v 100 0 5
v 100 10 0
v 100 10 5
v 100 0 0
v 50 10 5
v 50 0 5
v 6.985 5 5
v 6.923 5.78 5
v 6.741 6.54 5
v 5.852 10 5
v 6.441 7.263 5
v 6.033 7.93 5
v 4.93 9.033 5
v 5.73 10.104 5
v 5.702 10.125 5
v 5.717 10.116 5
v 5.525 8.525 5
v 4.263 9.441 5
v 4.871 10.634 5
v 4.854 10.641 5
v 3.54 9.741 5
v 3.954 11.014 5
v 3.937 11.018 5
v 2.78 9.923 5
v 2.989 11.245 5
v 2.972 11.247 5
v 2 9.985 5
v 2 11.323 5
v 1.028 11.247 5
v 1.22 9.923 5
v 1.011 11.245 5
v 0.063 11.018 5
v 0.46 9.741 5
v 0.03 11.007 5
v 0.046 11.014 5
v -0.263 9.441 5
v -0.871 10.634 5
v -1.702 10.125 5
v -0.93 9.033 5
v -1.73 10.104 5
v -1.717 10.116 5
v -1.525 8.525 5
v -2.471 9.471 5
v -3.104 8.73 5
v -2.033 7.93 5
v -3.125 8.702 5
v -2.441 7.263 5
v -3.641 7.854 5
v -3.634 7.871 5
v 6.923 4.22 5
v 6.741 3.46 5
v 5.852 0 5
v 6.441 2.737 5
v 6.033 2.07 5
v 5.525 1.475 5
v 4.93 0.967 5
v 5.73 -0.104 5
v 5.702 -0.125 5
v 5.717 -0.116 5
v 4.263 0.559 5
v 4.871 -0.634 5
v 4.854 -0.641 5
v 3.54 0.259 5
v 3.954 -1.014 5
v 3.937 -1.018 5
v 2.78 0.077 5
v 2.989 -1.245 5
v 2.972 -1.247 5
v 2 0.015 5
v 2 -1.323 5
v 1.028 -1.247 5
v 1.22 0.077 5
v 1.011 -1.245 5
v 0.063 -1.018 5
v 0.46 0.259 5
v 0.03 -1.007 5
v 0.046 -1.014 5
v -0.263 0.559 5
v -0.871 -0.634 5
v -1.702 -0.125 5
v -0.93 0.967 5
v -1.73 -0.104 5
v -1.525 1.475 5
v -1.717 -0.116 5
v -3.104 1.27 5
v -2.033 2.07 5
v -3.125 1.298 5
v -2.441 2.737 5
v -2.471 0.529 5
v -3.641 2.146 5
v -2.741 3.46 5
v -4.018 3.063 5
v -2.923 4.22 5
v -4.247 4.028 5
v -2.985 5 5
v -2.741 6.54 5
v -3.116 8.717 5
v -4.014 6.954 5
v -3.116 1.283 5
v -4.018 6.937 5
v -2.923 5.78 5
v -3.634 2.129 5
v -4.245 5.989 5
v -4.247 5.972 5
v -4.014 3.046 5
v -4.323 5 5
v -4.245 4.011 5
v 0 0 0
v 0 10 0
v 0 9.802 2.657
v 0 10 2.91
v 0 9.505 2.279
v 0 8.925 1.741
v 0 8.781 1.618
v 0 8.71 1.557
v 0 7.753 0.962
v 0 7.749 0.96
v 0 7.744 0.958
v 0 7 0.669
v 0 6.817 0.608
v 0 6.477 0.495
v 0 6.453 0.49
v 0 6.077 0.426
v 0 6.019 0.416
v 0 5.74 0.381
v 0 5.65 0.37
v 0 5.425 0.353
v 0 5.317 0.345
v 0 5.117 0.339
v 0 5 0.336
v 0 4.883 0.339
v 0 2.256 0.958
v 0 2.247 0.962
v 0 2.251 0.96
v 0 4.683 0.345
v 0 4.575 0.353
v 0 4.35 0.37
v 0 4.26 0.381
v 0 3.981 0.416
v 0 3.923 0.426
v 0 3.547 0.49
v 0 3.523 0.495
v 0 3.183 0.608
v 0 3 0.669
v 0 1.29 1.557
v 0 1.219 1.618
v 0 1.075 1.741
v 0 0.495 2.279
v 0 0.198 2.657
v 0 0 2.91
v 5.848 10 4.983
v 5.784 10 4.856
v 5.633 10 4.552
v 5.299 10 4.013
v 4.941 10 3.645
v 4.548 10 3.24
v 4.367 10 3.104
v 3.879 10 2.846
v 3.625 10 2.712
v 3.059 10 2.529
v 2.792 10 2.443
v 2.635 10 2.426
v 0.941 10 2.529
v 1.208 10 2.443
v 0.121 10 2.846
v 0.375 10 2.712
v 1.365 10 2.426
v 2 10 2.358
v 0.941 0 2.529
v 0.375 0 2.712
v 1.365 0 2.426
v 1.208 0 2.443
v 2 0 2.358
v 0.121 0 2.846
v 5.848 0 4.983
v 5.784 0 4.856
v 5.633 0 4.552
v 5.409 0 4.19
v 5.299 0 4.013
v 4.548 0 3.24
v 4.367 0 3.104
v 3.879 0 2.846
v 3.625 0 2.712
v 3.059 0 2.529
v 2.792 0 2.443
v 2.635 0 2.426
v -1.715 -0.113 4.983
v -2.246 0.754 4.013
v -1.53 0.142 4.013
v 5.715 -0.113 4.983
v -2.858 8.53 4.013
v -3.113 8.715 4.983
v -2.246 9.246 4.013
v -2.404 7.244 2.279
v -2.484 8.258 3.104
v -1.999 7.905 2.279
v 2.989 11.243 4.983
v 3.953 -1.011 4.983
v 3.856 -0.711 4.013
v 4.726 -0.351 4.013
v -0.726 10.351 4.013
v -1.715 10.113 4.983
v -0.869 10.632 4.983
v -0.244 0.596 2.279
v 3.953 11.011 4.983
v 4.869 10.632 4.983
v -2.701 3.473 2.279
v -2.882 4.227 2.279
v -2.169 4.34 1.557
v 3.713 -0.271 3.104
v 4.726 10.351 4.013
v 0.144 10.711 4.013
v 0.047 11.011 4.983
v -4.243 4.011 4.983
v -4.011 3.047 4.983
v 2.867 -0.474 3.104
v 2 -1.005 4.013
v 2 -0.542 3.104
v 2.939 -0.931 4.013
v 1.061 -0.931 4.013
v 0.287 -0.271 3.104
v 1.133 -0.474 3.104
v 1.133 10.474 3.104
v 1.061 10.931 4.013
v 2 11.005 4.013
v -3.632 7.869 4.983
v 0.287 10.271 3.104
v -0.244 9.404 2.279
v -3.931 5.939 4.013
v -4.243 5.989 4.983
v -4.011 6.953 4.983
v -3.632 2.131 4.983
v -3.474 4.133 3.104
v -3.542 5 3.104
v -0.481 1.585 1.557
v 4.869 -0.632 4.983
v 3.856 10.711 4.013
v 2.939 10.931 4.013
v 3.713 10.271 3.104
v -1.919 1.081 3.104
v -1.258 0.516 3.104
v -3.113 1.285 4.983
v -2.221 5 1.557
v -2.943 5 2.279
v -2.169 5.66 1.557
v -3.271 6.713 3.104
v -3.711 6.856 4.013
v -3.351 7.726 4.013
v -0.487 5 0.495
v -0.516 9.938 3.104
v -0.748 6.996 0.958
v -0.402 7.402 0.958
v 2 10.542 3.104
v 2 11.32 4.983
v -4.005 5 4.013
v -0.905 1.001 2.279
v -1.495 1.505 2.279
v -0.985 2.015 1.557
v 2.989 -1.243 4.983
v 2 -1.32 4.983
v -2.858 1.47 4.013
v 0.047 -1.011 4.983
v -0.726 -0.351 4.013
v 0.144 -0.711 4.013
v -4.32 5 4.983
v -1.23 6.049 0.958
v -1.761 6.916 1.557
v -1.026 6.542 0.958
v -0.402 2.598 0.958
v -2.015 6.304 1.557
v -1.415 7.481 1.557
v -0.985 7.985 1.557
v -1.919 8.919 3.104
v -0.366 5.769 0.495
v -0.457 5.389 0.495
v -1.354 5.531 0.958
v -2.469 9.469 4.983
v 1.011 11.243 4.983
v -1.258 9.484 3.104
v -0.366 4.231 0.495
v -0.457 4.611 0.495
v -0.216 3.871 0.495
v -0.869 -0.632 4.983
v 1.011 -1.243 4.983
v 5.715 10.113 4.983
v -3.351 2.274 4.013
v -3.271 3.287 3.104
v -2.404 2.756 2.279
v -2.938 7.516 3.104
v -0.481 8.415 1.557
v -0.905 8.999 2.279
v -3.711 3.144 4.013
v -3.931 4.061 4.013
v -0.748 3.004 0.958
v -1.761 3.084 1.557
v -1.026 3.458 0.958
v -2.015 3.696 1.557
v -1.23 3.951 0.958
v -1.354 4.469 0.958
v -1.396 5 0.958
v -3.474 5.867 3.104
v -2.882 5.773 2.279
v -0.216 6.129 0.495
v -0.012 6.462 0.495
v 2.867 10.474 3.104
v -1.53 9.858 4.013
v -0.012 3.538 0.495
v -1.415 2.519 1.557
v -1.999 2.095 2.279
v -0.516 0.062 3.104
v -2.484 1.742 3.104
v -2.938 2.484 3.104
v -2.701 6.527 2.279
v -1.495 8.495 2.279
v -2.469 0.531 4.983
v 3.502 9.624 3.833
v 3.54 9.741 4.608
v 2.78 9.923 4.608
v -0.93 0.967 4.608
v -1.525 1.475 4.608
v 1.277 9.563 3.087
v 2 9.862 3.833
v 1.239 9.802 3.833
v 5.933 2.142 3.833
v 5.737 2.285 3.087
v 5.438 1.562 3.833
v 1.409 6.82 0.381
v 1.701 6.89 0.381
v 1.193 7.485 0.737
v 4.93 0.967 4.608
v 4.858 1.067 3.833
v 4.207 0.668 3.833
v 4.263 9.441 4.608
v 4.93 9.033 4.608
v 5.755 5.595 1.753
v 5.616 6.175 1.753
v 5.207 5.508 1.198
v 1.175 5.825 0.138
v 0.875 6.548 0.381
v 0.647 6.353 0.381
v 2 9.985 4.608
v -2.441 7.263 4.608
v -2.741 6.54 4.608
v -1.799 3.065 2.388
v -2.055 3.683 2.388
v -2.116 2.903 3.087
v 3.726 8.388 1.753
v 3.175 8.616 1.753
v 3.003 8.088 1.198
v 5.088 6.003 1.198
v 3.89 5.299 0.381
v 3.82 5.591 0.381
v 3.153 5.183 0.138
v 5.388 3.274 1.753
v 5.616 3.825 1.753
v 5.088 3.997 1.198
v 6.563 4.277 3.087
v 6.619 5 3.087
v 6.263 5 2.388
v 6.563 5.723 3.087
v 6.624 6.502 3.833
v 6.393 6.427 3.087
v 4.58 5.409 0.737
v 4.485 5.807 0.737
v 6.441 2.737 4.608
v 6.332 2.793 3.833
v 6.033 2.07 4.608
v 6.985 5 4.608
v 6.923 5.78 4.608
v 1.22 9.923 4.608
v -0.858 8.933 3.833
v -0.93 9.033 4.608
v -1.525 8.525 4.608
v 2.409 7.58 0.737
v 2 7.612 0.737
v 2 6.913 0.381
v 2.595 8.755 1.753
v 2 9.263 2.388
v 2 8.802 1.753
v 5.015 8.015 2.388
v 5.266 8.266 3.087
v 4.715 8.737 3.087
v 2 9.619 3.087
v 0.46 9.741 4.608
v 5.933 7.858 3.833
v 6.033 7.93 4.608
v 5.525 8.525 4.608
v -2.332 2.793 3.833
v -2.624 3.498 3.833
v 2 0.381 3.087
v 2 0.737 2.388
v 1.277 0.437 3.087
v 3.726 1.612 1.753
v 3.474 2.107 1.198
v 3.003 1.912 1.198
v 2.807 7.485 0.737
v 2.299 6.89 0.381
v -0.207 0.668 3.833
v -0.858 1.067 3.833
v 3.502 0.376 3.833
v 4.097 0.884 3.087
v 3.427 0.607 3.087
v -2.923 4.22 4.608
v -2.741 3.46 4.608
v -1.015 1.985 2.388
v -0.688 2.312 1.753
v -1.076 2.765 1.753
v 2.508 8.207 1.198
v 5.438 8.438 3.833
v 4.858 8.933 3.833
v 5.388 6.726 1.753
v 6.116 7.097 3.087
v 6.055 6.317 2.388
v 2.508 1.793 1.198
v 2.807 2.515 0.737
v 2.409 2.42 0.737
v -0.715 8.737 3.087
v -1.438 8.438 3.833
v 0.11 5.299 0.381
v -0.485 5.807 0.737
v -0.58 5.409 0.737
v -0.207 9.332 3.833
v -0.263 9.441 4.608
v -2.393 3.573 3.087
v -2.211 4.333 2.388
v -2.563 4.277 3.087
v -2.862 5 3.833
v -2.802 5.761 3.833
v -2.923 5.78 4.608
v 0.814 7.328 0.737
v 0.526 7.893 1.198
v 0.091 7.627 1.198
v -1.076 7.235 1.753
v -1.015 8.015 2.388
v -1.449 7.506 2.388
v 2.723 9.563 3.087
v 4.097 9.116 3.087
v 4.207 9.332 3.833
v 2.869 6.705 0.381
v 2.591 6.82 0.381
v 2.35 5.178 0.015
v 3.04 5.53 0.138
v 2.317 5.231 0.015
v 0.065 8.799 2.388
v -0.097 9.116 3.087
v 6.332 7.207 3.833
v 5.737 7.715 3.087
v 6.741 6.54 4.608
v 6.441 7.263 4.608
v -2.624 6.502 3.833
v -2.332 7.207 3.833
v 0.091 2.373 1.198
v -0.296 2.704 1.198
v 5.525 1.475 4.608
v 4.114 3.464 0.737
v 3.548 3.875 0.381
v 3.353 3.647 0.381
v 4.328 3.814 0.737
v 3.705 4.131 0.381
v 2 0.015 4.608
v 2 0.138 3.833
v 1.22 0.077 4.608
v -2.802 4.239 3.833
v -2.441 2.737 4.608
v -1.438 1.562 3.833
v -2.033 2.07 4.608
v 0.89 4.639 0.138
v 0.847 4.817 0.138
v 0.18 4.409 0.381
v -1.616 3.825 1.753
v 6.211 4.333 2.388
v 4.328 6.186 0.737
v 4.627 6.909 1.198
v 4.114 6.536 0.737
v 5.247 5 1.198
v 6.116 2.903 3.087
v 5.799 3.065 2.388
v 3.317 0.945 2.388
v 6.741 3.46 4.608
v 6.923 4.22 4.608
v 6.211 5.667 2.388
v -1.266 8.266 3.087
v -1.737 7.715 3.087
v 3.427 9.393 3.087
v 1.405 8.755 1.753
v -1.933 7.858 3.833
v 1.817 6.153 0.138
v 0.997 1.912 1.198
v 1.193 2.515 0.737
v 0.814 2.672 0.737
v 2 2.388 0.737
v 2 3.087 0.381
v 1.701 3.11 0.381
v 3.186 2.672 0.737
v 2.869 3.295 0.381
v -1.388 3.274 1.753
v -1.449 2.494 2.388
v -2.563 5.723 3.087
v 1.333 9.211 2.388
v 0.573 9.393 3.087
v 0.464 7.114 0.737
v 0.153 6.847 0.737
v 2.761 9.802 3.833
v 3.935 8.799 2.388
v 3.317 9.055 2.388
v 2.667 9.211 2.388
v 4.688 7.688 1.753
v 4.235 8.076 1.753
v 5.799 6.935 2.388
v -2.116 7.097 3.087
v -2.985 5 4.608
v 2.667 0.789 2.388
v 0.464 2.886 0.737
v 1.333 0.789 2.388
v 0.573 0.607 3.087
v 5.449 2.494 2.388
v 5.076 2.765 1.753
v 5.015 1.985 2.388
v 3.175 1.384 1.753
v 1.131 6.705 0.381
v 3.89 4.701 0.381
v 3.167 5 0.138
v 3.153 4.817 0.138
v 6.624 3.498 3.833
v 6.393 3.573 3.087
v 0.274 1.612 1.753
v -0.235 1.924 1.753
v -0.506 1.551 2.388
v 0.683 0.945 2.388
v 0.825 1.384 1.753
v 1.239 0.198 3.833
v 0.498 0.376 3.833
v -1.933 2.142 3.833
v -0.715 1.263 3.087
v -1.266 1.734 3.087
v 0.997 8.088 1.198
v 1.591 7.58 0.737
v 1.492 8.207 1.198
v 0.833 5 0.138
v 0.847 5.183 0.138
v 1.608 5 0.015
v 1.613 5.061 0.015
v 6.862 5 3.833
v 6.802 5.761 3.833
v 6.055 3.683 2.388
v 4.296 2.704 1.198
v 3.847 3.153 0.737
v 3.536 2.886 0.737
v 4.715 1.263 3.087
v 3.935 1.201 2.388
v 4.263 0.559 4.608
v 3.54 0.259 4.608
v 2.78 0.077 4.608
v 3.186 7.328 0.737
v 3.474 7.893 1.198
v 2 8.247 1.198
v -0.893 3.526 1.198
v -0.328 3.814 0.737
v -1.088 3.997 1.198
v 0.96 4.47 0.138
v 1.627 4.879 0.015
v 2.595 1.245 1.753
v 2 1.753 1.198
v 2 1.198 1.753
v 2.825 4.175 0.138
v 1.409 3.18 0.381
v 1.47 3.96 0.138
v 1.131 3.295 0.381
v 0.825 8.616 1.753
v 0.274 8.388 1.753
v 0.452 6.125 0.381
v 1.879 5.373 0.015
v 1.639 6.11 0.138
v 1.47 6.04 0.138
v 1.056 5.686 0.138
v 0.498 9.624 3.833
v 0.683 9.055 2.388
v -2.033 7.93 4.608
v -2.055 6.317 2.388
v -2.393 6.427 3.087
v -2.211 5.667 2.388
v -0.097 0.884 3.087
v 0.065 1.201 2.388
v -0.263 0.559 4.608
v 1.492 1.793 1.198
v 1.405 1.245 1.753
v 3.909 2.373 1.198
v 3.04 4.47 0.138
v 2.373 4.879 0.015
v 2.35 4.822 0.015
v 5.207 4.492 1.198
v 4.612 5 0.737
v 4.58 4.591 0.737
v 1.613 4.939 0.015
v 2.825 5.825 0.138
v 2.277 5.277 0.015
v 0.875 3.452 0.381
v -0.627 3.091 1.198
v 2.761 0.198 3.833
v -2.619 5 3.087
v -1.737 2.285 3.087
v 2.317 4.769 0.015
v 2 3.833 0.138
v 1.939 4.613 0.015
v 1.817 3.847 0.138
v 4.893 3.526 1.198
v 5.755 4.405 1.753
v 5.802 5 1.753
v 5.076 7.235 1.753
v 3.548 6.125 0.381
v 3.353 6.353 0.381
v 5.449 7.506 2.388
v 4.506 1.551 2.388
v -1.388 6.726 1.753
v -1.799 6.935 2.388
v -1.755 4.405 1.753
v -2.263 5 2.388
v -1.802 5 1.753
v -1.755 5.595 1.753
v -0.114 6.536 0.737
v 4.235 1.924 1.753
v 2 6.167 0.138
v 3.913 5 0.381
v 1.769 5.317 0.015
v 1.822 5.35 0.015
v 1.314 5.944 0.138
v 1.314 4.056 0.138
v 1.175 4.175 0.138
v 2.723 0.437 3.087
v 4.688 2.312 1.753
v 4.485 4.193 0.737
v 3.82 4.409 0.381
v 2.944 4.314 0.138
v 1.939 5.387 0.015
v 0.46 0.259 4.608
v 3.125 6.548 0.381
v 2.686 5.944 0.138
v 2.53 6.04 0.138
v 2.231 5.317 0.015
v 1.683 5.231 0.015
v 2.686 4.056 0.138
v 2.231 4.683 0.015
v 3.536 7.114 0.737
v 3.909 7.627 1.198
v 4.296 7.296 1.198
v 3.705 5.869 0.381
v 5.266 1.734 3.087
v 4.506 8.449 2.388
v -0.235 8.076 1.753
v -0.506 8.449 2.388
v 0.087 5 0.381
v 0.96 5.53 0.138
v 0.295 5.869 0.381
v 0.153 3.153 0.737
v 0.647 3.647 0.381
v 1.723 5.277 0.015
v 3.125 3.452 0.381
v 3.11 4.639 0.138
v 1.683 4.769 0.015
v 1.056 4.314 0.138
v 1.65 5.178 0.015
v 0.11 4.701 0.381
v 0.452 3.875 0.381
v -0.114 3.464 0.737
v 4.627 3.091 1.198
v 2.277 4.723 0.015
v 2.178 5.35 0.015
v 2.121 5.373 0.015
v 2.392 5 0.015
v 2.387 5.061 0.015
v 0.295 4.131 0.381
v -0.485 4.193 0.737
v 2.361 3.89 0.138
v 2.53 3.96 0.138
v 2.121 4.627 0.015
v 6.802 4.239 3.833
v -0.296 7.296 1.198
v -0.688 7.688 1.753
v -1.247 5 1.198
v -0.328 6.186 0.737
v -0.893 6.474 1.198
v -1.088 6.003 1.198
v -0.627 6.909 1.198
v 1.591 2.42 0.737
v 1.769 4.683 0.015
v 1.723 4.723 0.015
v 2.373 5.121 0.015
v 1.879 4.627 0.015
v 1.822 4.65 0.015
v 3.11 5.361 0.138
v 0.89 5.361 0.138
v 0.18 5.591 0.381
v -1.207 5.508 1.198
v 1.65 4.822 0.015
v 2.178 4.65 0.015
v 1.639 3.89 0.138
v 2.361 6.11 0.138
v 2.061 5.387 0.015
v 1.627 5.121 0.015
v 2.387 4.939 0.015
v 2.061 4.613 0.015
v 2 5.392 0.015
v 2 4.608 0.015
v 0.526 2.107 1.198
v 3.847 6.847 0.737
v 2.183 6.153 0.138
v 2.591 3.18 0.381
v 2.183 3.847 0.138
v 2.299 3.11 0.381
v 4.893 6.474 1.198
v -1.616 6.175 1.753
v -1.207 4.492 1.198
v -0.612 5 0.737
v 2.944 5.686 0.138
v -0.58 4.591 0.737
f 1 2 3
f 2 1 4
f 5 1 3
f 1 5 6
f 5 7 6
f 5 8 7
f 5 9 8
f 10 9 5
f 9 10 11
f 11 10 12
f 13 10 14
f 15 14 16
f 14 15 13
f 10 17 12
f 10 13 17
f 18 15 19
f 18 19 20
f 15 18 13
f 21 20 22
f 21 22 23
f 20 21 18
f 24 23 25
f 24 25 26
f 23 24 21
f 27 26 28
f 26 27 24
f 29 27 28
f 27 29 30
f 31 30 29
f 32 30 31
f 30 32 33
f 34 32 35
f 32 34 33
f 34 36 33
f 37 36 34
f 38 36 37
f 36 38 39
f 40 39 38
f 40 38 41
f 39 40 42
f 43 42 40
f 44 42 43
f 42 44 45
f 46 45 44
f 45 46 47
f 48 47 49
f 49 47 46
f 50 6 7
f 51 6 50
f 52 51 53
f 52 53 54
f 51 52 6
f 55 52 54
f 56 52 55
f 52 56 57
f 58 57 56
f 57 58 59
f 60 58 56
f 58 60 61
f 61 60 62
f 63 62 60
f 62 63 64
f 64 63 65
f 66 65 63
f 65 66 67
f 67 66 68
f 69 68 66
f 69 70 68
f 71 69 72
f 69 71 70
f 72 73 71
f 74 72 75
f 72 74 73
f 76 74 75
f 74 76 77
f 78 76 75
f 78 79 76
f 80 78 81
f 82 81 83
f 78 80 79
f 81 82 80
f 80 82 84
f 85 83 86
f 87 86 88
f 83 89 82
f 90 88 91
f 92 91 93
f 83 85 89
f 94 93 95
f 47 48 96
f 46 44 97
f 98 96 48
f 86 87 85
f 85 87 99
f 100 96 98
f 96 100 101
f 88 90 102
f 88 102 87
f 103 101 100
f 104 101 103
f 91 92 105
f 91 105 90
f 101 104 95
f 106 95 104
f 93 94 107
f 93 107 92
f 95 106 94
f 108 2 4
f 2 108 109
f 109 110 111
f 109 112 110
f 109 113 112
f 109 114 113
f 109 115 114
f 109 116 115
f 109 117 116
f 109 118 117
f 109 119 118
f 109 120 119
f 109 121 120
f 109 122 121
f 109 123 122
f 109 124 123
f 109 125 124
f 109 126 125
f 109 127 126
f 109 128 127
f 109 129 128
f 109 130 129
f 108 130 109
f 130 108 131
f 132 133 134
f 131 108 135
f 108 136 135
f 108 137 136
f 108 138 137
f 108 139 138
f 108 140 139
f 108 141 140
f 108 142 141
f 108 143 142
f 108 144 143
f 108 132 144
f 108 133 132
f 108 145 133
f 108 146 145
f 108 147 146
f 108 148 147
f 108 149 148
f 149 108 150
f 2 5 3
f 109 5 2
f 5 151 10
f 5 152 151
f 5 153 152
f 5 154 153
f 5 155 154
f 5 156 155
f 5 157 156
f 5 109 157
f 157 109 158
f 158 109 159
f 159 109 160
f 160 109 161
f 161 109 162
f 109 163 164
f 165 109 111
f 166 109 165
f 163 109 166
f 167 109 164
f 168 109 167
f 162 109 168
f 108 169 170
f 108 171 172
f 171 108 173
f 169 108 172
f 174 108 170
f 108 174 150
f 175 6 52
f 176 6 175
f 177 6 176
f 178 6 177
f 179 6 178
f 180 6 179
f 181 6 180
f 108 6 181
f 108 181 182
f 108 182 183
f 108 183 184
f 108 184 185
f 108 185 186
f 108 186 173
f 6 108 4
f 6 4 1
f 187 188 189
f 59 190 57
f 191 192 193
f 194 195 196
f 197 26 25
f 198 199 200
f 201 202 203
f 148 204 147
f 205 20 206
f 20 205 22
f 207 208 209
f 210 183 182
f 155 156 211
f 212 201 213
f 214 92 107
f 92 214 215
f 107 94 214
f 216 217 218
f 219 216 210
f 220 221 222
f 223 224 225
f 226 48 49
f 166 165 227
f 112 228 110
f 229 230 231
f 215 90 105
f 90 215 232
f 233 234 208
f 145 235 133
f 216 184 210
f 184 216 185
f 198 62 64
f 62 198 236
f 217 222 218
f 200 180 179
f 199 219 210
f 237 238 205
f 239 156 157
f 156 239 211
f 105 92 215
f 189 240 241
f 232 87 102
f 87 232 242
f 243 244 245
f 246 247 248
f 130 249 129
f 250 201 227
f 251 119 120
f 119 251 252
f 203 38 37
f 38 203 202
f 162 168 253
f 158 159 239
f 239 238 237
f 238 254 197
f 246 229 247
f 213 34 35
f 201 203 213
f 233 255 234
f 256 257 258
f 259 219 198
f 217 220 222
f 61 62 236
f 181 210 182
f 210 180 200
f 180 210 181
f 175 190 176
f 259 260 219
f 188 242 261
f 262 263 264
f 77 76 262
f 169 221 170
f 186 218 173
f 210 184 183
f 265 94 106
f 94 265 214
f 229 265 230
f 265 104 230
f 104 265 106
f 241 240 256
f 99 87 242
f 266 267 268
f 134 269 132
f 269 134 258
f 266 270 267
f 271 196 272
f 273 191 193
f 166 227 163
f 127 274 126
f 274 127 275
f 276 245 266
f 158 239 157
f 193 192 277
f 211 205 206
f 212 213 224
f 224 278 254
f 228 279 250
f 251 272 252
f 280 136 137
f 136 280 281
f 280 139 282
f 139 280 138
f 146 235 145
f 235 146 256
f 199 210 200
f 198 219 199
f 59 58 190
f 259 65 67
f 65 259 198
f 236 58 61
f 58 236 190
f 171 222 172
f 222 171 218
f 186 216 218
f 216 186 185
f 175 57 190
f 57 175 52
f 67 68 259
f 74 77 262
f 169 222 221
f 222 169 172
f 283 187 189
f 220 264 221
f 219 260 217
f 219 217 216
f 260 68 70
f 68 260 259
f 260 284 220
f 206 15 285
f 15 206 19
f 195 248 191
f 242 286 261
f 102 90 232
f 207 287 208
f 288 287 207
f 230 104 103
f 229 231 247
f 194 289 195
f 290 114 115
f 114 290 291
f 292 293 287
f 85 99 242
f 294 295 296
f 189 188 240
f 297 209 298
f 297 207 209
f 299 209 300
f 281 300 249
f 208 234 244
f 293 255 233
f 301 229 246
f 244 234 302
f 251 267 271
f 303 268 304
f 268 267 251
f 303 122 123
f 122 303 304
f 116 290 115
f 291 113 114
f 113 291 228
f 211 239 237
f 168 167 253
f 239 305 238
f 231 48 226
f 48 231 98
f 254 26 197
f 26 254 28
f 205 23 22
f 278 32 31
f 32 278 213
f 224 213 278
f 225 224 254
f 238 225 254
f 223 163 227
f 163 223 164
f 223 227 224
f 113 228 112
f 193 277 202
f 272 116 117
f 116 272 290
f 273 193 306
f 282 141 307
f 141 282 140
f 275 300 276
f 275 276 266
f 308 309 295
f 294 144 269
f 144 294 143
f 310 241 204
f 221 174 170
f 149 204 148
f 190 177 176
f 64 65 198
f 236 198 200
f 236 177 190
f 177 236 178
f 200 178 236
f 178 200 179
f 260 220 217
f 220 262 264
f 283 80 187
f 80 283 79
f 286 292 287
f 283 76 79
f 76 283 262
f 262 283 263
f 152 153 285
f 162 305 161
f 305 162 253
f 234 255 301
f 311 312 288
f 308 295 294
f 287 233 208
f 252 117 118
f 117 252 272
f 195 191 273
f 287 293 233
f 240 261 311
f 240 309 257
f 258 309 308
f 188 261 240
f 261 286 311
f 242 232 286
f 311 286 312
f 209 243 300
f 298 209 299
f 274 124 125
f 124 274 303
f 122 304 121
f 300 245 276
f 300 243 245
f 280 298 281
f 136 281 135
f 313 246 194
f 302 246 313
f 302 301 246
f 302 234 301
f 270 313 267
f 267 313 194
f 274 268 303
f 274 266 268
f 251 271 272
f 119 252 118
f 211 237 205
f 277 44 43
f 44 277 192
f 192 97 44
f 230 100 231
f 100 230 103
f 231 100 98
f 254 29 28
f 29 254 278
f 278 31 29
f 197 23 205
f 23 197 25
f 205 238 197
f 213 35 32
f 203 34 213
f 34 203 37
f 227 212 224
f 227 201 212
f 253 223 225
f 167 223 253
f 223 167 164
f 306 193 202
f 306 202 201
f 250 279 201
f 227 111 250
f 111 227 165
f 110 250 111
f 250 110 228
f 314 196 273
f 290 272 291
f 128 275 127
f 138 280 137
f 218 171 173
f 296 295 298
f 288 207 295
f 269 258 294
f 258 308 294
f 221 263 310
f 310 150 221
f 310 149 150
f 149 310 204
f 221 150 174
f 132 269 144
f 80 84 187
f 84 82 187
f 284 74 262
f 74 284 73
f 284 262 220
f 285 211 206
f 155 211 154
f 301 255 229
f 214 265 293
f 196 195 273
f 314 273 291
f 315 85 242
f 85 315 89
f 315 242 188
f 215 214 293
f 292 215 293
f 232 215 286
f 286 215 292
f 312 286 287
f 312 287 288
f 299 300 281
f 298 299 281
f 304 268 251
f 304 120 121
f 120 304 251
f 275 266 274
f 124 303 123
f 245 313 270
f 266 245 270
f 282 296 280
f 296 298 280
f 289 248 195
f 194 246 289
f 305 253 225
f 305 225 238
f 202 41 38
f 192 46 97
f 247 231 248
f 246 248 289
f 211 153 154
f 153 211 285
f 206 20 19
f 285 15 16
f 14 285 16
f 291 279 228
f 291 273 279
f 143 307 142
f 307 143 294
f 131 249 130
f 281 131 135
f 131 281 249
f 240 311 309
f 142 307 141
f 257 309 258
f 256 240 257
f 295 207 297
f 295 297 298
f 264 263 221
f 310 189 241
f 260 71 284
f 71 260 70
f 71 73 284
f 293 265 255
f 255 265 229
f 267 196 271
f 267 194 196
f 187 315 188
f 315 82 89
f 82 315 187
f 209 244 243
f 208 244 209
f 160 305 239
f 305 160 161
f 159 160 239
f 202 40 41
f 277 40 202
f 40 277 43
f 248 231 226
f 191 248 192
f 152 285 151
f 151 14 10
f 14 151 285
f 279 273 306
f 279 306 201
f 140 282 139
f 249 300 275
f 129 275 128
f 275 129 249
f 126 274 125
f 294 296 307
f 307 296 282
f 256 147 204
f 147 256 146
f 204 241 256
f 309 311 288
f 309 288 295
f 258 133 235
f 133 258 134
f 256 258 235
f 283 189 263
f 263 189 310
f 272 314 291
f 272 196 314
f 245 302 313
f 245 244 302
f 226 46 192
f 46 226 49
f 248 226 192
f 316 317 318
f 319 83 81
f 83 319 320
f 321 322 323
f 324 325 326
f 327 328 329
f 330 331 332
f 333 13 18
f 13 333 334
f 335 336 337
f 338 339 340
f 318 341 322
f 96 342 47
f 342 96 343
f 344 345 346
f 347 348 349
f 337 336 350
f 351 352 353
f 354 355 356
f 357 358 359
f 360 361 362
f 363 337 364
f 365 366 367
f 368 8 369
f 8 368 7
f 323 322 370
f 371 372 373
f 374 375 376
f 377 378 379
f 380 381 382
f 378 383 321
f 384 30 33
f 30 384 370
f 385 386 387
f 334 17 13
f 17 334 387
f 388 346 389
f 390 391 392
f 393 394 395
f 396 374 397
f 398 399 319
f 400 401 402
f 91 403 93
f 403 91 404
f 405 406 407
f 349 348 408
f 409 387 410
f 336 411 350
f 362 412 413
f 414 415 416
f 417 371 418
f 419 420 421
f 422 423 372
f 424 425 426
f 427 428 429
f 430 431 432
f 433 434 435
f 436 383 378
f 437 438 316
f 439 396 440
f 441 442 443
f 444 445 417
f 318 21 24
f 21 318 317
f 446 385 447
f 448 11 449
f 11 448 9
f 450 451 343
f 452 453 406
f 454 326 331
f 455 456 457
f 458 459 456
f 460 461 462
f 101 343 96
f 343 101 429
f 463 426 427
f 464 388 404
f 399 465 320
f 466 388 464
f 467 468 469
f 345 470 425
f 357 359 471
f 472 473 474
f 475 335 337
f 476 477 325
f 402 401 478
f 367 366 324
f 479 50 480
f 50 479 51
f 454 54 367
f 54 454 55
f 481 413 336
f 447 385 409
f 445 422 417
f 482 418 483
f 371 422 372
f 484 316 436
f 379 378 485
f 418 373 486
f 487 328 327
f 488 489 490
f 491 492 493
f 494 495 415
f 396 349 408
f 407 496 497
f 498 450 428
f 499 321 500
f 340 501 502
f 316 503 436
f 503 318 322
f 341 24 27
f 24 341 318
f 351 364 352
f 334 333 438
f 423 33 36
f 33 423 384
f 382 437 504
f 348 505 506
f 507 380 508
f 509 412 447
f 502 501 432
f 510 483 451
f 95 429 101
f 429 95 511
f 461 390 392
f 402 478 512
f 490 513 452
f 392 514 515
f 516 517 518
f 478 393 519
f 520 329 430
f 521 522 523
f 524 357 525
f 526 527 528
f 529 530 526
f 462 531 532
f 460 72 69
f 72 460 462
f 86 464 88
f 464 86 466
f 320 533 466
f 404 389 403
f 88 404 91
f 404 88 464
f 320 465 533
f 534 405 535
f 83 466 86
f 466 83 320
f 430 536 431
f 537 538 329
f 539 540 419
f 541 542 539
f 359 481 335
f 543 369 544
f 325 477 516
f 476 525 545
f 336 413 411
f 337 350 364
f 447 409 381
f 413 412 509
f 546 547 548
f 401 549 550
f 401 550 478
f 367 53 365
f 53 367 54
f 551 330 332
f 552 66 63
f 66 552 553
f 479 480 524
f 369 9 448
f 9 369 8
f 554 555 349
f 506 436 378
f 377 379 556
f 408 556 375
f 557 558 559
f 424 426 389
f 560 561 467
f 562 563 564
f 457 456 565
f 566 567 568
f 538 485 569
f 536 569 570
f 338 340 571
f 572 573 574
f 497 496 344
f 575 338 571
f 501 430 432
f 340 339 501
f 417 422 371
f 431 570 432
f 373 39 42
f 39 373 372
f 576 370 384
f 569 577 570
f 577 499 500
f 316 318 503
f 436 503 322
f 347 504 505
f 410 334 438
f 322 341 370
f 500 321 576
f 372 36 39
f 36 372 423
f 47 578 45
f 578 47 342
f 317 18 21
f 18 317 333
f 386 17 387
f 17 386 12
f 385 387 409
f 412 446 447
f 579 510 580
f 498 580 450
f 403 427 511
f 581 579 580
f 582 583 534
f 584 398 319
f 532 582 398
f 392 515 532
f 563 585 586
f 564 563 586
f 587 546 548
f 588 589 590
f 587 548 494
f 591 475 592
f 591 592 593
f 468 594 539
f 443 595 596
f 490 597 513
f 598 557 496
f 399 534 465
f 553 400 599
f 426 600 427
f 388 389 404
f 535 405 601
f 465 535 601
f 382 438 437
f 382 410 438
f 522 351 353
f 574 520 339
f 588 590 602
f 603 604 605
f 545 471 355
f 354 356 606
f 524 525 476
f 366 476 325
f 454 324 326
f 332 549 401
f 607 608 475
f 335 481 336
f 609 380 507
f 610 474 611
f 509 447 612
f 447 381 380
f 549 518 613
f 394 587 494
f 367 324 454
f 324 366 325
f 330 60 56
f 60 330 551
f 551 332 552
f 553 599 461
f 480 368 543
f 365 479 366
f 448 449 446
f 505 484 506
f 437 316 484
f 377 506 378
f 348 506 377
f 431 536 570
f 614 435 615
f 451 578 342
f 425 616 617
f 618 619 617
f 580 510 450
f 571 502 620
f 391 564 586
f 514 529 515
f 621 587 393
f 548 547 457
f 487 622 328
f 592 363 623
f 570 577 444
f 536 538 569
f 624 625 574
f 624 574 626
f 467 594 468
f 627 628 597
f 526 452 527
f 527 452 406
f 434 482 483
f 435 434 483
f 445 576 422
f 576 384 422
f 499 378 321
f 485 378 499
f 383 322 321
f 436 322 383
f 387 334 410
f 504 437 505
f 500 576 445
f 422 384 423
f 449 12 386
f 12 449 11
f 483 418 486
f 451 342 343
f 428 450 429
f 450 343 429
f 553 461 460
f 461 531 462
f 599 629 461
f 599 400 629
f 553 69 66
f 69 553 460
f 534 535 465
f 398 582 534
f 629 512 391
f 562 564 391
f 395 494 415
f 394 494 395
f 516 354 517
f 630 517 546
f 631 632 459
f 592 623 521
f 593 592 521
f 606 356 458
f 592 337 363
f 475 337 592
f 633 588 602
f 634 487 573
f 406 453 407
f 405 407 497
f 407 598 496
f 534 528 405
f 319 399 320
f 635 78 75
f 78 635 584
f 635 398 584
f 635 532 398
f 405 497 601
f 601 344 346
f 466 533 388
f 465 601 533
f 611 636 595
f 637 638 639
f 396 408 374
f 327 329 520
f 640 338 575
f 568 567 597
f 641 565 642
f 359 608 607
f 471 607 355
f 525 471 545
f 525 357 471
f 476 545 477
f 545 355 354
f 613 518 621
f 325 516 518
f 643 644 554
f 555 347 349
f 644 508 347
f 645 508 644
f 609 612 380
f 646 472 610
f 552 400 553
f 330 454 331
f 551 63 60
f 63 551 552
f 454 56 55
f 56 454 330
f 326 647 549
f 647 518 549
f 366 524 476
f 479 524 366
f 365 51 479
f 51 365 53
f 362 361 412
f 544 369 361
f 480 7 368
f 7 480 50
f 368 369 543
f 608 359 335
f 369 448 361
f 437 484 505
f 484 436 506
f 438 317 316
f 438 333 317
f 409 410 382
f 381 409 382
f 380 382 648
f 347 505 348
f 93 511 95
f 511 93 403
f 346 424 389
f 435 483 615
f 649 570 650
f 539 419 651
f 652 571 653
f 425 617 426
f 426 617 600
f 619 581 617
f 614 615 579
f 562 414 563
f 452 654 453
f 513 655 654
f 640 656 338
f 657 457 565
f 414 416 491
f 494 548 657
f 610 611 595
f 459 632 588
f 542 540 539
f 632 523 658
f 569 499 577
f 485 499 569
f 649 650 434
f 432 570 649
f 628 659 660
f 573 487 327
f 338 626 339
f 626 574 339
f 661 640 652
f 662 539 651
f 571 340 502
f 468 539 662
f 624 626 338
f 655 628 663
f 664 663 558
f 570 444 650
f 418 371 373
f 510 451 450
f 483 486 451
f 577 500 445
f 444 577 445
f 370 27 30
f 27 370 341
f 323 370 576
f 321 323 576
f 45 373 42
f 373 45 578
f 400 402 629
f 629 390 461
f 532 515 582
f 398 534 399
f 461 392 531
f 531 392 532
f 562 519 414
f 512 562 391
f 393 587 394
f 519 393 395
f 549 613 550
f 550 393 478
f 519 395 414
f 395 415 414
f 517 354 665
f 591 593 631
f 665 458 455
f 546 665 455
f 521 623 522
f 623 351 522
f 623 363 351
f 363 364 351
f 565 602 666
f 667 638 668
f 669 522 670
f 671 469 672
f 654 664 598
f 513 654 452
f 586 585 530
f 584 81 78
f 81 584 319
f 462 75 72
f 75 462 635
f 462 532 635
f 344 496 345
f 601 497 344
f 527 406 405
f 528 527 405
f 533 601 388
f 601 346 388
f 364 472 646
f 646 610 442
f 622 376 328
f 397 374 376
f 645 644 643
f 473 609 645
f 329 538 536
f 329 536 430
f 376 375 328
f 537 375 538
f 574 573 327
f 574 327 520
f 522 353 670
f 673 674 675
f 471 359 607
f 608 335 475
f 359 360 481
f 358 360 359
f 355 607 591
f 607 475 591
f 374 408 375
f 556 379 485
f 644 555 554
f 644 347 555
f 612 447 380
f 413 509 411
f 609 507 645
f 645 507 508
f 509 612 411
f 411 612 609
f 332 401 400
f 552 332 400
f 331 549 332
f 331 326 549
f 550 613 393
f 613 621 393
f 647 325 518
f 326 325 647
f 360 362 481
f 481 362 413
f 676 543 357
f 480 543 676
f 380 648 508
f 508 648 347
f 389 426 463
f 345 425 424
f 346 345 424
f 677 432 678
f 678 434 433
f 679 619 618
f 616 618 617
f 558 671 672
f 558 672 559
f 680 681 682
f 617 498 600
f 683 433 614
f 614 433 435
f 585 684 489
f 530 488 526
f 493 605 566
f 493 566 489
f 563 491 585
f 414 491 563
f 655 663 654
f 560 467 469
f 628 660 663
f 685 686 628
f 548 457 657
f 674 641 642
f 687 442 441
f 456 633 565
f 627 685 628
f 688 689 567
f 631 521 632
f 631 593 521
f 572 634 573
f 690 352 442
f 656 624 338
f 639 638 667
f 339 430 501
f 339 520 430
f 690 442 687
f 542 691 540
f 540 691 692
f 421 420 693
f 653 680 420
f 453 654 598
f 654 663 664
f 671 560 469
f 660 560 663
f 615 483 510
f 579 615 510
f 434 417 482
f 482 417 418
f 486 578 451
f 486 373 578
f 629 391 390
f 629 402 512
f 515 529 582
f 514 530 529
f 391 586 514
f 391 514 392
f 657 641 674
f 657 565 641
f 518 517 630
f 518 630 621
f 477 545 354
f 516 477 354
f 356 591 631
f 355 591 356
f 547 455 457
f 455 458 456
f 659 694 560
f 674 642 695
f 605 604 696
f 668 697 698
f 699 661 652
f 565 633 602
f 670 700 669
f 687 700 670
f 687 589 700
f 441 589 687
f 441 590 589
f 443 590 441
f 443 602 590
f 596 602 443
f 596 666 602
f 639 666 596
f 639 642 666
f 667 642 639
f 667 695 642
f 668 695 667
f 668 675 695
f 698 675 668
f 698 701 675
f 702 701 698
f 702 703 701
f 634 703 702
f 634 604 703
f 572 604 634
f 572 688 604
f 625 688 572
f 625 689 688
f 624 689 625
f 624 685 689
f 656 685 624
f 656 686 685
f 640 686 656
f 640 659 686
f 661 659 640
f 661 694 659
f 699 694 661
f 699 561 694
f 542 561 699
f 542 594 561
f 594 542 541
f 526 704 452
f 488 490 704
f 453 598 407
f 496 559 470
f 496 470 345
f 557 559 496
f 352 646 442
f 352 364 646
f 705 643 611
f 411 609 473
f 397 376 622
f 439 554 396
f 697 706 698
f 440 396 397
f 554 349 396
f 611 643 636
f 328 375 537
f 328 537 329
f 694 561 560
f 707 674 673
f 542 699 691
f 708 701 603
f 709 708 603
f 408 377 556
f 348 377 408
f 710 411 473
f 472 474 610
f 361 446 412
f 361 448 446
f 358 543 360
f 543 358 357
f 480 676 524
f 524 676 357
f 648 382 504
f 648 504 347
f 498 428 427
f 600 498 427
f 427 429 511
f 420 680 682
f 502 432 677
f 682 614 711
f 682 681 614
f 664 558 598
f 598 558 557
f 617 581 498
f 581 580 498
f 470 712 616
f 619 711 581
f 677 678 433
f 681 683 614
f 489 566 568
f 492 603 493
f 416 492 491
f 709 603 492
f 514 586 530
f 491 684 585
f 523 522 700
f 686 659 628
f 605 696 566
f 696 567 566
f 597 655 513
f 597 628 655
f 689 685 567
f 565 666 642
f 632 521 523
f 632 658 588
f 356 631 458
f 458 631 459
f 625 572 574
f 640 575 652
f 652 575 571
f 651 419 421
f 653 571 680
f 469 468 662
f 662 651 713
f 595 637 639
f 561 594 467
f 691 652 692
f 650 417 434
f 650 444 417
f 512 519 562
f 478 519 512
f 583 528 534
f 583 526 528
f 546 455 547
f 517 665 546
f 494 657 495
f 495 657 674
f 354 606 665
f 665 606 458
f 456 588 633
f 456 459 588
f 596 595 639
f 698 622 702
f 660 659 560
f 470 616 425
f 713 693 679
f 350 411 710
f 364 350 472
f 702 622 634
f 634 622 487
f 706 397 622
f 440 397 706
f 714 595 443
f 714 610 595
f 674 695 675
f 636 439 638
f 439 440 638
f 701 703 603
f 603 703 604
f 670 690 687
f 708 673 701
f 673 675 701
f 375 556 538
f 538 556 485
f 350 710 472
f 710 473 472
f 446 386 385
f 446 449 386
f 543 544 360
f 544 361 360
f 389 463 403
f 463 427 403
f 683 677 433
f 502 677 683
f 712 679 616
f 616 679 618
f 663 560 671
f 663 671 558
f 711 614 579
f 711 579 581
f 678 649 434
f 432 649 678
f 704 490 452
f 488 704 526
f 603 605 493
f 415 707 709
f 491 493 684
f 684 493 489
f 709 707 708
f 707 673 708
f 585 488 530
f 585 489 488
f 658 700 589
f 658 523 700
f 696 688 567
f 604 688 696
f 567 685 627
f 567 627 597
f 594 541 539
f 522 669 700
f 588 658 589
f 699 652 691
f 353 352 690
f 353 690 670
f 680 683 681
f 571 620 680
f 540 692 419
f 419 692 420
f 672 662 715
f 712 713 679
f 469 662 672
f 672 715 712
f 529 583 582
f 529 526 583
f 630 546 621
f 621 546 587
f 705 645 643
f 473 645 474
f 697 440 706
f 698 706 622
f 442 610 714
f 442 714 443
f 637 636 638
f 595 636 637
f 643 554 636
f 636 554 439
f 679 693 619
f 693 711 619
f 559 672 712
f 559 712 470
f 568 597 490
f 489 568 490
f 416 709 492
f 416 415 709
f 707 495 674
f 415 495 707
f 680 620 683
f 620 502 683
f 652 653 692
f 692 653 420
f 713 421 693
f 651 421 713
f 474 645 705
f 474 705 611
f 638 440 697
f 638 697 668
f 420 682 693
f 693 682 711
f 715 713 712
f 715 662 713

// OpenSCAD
$fn=40;
handle_len = 100;
handle_thickness = 5;
handle_width = 10;
spoon_id = 10;
spoon_thickness = 3;
spoon_od = spoon_id + spoon_thickness;

module almost() {
    
cube([handle_len,handle_width, handle_thickness]);
translate([2,handle_width/2,spoon_od/2]) sphere(d=spoon_od);

difference()
{
}
}
difference()
{
    almost();
    translate([-50,-50,handle_thickness]) cube([100,100,100]);    
    translate([2,handle_width/2,spoon_id/2]) sphere(d=spoon_id);

}
    
